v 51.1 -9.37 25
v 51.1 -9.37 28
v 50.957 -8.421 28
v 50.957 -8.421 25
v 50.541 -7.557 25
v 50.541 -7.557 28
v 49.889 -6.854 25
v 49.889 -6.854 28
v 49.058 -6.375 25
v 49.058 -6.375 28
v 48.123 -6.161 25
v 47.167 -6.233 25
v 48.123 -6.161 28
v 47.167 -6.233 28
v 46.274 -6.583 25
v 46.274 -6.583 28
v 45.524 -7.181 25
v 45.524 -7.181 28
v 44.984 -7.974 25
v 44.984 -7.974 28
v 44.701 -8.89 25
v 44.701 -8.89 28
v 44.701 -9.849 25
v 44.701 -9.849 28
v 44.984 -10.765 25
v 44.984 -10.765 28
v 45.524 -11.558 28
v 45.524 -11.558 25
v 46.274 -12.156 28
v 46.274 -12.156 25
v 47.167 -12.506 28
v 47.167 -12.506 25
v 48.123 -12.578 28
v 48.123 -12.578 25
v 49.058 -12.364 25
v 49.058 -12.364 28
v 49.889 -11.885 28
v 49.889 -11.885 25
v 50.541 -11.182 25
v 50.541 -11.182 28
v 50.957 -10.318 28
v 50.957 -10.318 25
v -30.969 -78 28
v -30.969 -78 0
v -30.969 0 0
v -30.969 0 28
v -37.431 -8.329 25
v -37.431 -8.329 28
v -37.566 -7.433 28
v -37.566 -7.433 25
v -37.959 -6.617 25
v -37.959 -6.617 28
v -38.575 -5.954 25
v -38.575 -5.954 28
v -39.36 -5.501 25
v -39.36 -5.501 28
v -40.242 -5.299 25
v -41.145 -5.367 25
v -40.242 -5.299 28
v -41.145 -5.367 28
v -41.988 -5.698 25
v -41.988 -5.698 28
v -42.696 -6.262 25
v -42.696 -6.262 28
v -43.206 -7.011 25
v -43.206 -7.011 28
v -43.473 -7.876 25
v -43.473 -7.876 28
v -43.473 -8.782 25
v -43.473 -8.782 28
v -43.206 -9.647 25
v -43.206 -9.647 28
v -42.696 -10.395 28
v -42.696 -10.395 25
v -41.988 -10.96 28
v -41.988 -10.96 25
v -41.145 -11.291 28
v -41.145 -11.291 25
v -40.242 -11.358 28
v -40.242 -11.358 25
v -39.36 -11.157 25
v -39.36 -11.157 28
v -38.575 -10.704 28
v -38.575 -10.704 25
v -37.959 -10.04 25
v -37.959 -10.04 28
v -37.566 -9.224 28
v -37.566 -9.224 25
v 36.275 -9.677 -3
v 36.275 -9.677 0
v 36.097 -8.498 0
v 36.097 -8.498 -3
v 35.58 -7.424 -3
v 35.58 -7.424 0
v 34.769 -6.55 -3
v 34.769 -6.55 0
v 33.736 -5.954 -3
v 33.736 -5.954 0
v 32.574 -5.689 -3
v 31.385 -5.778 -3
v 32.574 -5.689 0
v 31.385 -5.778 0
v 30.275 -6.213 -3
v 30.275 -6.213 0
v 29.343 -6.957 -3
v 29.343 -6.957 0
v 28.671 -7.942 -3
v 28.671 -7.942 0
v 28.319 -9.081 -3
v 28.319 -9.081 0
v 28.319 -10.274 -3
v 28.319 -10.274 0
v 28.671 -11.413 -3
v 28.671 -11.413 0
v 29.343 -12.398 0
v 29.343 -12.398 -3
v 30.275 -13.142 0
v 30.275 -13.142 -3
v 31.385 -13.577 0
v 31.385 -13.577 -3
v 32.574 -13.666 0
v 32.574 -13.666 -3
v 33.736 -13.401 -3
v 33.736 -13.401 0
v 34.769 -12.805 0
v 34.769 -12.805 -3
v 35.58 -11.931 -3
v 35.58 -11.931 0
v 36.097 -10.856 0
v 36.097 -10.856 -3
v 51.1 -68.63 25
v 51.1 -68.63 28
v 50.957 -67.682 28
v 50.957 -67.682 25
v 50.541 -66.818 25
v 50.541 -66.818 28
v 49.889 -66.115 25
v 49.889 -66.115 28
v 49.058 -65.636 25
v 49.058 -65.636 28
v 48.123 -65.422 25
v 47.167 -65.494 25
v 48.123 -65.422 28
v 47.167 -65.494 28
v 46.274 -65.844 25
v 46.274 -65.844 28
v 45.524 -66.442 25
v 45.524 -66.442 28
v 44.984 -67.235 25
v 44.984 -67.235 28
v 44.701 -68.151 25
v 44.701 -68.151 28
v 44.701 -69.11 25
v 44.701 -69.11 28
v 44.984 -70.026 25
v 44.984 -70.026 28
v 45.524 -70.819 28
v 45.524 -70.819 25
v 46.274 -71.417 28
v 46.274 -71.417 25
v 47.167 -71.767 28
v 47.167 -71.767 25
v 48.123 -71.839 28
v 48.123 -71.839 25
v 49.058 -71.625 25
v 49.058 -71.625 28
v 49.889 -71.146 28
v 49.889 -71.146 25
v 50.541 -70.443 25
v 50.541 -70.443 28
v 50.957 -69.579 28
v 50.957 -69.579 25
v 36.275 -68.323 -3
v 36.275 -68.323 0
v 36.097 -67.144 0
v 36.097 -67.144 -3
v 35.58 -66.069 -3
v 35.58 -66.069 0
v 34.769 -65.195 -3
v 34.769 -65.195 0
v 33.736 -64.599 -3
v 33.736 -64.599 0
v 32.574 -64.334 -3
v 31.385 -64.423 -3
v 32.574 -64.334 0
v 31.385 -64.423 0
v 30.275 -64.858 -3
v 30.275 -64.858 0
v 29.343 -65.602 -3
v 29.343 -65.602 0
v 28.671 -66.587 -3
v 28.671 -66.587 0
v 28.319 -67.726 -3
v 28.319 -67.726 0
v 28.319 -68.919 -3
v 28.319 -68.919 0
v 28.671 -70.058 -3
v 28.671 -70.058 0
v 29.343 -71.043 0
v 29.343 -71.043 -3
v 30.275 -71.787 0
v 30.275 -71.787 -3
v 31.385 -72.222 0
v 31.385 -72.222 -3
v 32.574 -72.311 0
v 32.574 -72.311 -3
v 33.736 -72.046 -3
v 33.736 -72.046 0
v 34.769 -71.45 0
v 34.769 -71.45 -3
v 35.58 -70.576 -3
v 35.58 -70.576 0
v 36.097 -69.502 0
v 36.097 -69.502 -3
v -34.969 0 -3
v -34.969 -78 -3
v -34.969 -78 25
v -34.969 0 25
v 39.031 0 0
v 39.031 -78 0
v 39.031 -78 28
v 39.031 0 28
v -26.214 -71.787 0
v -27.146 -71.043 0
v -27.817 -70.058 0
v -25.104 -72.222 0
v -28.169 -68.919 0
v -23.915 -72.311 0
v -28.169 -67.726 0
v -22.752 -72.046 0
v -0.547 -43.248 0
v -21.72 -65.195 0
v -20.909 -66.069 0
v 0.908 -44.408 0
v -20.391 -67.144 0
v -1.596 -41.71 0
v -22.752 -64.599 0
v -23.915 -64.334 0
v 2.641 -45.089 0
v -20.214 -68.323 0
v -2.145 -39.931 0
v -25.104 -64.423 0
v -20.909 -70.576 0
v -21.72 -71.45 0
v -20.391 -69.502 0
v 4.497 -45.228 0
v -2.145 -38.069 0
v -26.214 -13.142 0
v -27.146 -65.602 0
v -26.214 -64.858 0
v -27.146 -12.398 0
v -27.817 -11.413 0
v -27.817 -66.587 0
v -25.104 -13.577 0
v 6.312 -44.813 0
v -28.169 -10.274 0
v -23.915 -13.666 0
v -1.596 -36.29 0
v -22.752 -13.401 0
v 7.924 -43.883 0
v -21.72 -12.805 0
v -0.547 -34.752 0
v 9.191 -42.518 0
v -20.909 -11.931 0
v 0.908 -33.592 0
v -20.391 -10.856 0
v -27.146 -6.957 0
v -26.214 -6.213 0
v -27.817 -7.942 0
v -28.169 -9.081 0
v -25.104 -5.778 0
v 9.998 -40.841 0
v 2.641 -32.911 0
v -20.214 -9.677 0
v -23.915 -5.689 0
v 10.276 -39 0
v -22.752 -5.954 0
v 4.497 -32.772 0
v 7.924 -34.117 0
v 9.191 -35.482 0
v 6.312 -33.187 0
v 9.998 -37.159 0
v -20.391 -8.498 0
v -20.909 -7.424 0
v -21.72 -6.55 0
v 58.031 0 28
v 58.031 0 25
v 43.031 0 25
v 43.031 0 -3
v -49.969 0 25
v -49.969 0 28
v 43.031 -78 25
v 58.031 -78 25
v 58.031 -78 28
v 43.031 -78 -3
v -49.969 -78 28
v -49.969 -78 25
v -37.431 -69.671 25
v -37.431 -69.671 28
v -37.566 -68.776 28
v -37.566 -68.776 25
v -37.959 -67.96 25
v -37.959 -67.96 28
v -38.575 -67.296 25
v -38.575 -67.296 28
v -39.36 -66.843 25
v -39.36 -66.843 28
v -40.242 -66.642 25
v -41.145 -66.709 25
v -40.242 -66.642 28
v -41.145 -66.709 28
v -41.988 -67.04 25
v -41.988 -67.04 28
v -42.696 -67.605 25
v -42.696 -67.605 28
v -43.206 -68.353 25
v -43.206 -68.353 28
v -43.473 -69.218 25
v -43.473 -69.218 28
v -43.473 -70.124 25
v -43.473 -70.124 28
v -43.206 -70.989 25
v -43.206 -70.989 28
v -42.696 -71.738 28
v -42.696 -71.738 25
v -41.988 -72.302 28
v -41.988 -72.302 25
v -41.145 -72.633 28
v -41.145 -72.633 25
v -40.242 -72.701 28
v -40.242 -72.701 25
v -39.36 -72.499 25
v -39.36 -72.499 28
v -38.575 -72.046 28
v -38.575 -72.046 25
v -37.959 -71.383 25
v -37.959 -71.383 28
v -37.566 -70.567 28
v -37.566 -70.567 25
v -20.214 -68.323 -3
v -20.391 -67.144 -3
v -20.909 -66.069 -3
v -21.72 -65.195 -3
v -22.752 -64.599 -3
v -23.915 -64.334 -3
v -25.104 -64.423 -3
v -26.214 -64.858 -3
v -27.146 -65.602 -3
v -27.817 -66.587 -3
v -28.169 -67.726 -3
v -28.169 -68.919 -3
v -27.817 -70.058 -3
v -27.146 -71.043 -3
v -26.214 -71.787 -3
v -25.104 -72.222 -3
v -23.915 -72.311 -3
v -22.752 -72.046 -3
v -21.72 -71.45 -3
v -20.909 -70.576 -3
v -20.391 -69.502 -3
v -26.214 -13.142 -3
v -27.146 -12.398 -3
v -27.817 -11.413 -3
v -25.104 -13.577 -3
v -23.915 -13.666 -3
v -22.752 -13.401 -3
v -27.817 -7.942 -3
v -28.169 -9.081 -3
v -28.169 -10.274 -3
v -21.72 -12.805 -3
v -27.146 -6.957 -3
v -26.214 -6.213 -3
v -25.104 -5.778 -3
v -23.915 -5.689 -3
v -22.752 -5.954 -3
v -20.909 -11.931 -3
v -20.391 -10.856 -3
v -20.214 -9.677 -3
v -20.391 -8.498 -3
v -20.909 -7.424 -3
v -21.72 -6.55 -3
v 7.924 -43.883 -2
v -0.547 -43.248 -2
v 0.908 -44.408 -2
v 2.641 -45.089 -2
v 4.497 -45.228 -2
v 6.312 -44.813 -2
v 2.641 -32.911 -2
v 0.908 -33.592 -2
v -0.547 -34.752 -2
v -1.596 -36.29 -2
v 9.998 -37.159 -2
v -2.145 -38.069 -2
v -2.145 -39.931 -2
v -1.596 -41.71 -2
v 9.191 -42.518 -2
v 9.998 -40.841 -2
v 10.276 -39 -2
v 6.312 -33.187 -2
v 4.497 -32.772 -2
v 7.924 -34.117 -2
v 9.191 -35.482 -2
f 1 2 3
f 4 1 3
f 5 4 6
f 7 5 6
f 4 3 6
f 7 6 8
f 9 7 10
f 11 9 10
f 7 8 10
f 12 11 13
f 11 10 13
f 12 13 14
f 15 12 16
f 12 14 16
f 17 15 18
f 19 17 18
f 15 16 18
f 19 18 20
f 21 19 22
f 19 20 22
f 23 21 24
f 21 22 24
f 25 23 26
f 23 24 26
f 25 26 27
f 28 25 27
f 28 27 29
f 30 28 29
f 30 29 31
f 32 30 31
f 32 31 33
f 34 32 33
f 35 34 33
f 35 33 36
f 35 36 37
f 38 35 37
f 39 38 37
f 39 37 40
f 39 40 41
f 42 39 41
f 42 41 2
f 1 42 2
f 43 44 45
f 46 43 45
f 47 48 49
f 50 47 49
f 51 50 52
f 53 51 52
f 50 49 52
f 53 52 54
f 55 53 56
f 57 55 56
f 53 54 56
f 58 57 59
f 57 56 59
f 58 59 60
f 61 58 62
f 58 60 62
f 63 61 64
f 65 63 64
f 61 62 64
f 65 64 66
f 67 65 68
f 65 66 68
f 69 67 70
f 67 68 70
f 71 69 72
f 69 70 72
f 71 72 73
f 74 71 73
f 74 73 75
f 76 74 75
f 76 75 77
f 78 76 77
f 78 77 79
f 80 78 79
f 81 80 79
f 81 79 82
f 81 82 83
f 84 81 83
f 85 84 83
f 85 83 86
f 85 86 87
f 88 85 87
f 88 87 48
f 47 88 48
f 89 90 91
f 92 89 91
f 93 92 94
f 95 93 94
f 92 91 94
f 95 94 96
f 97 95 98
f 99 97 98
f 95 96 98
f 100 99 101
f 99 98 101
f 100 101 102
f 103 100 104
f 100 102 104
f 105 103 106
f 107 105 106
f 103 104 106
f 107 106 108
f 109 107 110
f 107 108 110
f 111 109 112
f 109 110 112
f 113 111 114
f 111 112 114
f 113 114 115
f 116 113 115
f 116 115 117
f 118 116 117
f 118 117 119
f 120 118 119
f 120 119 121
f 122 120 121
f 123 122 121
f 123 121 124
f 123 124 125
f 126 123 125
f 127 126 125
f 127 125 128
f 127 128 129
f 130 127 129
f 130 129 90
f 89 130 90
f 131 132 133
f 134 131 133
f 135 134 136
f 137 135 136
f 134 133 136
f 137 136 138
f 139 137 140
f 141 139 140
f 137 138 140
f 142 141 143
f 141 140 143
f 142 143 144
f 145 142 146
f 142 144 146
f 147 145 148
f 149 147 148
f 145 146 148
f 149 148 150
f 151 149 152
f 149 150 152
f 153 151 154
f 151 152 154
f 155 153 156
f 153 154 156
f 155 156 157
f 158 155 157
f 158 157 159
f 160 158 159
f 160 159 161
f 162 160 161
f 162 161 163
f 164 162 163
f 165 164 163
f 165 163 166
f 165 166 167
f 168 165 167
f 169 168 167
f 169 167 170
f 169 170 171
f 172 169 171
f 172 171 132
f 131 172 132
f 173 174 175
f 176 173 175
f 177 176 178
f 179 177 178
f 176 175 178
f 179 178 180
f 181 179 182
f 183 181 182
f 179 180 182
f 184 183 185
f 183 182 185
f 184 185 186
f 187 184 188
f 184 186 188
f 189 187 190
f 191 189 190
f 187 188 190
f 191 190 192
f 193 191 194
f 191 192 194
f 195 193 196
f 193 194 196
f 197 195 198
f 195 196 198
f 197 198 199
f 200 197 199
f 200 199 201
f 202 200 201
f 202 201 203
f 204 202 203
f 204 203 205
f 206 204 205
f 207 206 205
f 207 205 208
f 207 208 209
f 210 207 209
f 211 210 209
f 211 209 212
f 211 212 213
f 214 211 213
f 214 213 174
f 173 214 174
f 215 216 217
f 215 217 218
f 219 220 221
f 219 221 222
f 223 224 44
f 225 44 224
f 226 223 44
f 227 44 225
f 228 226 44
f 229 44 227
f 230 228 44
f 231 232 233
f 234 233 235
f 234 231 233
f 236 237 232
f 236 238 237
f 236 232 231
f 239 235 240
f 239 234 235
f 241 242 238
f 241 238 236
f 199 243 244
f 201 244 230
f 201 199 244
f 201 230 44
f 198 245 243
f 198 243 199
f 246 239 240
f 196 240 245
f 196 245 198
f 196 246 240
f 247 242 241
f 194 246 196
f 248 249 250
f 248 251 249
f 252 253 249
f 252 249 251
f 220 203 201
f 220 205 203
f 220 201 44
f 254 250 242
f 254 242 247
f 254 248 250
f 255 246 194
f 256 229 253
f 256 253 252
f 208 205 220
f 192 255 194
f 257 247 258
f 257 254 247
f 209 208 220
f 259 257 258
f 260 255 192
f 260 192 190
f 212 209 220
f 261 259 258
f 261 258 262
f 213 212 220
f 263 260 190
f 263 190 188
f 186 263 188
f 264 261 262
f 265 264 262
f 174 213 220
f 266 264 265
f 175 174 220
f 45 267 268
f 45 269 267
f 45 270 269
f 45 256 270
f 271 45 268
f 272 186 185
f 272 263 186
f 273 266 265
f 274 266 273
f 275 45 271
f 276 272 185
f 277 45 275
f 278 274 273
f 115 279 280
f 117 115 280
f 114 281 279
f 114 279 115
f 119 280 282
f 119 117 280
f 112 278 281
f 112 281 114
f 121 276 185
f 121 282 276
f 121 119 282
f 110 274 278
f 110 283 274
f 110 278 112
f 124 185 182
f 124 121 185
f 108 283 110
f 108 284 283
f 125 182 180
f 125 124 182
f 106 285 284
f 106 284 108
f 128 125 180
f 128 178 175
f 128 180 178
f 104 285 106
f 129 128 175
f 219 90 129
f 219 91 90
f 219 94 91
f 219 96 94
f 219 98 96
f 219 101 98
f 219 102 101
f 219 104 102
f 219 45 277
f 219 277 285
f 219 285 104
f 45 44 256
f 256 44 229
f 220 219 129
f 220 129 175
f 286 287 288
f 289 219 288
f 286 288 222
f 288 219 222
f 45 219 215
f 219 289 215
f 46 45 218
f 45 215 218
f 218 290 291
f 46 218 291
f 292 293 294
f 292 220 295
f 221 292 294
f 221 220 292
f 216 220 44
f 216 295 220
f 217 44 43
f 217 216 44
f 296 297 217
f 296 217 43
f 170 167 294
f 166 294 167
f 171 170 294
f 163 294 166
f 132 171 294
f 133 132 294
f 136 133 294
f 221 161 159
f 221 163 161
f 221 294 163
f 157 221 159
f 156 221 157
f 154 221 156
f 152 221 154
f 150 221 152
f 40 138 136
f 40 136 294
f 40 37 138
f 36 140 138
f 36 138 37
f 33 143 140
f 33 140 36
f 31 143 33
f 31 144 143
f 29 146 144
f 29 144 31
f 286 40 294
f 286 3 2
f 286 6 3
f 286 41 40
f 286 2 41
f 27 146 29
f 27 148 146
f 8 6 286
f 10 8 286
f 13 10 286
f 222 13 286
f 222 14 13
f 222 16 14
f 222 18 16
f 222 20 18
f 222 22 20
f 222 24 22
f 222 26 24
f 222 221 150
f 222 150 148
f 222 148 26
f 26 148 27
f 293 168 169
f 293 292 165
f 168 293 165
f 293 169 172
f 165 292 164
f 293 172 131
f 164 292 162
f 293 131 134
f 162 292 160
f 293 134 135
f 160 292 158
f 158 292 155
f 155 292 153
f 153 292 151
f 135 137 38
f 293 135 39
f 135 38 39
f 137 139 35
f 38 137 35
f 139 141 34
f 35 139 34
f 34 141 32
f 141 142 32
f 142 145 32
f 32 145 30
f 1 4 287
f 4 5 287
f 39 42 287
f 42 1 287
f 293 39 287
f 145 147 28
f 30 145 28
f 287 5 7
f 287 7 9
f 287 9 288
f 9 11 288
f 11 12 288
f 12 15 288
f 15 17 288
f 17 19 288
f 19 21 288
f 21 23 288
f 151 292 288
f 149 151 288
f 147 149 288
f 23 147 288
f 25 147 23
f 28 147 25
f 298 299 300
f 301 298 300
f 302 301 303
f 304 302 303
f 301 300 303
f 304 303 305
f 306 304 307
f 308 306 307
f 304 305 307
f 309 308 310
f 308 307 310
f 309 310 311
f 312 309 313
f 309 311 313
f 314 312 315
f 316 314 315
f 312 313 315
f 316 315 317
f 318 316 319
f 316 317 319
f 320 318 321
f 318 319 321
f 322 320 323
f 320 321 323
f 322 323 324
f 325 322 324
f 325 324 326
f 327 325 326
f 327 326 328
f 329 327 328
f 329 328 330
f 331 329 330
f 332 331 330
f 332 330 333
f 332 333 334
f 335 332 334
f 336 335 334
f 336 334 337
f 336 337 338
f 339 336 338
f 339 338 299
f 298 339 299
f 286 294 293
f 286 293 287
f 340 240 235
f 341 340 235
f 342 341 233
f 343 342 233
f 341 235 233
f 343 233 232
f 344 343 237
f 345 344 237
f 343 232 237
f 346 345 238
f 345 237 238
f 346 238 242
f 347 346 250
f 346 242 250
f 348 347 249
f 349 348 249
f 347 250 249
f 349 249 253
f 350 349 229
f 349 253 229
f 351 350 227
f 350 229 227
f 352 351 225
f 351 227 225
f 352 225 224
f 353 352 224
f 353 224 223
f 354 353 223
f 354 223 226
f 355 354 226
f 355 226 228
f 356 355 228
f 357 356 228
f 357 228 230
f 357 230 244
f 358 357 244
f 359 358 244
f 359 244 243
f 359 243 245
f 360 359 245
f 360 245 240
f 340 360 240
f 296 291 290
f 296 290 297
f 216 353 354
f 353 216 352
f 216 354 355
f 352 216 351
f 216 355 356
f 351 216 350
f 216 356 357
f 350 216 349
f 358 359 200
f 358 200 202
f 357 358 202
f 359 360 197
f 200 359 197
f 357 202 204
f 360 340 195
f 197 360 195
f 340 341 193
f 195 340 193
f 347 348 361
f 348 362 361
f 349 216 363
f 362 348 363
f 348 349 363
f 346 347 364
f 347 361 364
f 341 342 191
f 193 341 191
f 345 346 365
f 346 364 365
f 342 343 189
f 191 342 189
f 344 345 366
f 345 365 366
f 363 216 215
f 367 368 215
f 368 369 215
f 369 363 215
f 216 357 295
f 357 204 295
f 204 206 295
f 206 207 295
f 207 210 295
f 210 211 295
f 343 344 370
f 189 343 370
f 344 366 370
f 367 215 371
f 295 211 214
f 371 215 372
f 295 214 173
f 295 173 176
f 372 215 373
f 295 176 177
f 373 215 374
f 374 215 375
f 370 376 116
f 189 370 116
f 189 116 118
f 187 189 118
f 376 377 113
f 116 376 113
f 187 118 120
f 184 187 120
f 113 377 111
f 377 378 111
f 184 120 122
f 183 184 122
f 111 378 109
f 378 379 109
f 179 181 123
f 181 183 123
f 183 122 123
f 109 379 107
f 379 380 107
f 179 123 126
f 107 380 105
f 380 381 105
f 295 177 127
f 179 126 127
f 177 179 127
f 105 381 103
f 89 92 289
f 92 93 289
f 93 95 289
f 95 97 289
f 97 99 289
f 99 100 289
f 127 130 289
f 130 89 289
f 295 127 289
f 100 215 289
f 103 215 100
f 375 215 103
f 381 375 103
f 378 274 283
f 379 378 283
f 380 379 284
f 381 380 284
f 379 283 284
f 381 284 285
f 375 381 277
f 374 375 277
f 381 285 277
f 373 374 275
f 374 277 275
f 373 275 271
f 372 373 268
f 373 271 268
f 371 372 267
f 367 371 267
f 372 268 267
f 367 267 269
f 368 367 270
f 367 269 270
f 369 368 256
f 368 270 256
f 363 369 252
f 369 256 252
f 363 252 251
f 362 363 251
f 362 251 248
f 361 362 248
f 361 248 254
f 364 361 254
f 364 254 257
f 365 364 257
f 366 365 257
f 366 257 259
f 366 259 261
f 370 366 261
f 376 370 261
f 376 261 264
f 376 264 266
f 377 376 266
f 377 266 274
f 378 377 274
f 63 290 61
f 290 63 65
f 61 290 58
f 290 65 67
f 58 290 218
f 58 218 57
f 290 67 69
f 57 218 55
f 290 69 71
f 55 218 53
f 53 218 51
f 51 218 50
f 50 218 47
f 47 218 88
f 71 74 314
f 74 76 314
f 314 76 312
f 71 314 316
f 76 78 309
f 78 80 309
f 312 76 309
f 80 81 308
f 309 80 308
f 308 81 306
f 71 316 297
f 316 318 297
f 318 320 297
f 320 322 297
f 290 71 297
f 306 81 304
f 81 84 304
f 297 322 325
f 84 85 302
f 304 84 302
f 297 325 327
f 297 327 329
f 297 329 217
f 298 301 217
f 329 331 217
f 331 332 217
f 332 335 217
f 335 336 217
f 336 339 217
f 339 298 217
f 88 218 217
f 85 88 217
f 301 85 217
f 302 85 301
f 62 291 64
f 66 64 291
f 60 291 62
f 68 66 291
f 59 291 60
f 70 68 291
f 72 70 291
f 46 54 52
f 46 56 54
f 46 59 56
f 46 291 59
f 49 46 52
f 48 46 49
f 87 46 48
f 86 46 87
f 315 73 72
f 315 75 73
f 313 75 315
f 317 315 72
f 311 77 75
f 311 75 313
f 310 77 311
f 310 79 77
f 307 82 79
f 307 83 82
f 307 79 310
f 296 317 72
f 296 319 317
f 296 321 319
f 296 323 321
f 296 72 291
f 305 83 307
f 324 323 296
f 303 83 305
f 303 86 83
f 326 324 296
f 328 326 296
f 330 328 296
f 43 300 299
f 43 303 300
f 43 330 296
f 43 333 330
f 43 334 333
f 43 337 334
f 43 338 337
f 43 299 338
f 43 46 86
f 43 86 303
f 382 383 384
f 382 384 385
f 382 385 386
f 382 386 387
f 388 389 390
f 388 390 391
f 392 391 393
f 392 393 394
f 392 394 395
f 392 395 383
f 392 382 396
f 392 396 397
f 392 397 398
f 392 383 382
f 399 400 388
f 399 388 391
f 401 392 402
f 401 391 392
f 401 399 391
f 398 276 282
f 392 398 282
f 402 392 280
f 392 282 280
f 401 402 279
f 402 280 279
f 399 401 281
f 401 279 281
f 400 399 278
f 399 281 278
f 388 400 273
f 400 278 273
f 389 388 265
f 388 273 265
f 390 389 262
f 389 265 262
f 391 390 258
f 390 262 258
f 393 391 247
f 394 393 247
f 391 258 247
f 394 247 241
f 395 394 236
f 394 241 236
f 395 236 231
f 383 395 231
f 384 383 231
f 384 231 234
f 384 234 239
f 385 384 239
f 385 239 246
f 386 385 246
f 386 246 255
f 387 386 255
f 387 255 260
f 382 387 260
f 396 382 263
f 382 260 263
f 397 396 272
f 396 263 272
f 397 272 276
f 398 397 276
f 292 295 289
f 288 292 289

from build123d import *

# Parameters (mm, degrees)
F0_W      = 78
F0_H      = 3
F1_DEPTH  = 78
F2_W      = 4
F2_H      = 78
F3_DEPTH  = 28
F4_W      = 4
F4_H      = 78
F5_DEPTH  = 28
F6_W      = 78
F6_H      = 3
F7_DEPTH  = 15
F8_W      = 78
F8_H      = 3
F9_DEPTH  = 15
F12_R     = 3.217192
F13_DEPTH = 22.5
F14_R     = 3.037913
F15_DEPTH = 18.4
F10_R     = 6.245135
F16_DEPTH = 2
F11_R     = 4
F17_DEPTH = 12.6


with BuildPart() as f1:
    # F0 (on Front) → F1 (new body)
    with BuildSketch(Plane.XZ):
        with Locations((4.030592, -1.5)):
            Rectangle(F0_W, F0_H)
    extrude(amount=F1_DEPTH)

    # F2 (on face) → F3 (join)
    with BuildSketch(Plane.XY):
        with Locations((-32.969408, -39)):
            Rectangle(F2_W, F2_H)
    extrude(amount=F3_DEPTH)

    # F4 (on face) → F5 (join)
    with BuildSketch(Plane.XY):
        with Locations((41.030592, -39)):
            Rectangle(F4_W, F4_H)
    extrude(amount=F5_DEPTH)

    # F6 (on face) → F7 (join)
    with BuildSketch(Plane(origin=(-34.969408, 0, 0), x_dir=(0, -1, 0), z_dir=(-1, 0, 0))):
        with Locations((39, 26.5)):
            Rectangle(F6_W, F6_H)
    extrude(amount=F7_DEPTH)

    # F8 (on face) → F9 (join)
    with BuildSketch(Plane.YZ.offset(43.030592)):
        with Locations((-39, 26.5)):
            Rectangle(F8_W, F8_H)
    extrude(amount=F9_DEPTH)

    # F12 (on face) → F13 (cut)
    with BuildSketch(Plane.XY.offset(28)):
        with Locations((47.882639, -9.369526)):
            Circle(F12_R)
        with Locations((47.882639, -68.630474)):
            Circle(F12_R)
    extrude(amount=-F13_DEPTH, mode=Mode.SUBTRACT)

    # F14 (on face) → F15 (cut)
    with BuildSketch(Plane.XY.offset(28)):
        with Locations((-40.469408, -8.328774)):
            Circle(F14_R)
        with Locations((-40.469408, -69.671226)):
            Circle(F14_R)
    extrude(amount=-F15_DEPTH, mode=Mode.SUBTRACT)

    # F10 (on face) → F16 (cut)
    with BuildSketch(Plane.XY):
        with Locations((4.030592, -39)):
            Circle(F10_R)
    extrude(amount=-F16_DEPTH, mode=Mode.SUBTRACT)

    # F11 (on face) → F17 (cut)
    with BuildSketch(Plane.XY):
        with Locations((-24.21356, -9.677462)):
            Circle(F11_R)
        with Locations((32.274744, -9.677462)):
            Circle(F11_R)
        with Locations((-24.21356, -68.322538)):
            Circle(F11_R)
        with Locations((32.274744, -68.322538)):
            Circle(F11_R)
    extrude(amount=-F17_DEPTH, mode=Mode.SUBTRACT)


solid = f1.part
